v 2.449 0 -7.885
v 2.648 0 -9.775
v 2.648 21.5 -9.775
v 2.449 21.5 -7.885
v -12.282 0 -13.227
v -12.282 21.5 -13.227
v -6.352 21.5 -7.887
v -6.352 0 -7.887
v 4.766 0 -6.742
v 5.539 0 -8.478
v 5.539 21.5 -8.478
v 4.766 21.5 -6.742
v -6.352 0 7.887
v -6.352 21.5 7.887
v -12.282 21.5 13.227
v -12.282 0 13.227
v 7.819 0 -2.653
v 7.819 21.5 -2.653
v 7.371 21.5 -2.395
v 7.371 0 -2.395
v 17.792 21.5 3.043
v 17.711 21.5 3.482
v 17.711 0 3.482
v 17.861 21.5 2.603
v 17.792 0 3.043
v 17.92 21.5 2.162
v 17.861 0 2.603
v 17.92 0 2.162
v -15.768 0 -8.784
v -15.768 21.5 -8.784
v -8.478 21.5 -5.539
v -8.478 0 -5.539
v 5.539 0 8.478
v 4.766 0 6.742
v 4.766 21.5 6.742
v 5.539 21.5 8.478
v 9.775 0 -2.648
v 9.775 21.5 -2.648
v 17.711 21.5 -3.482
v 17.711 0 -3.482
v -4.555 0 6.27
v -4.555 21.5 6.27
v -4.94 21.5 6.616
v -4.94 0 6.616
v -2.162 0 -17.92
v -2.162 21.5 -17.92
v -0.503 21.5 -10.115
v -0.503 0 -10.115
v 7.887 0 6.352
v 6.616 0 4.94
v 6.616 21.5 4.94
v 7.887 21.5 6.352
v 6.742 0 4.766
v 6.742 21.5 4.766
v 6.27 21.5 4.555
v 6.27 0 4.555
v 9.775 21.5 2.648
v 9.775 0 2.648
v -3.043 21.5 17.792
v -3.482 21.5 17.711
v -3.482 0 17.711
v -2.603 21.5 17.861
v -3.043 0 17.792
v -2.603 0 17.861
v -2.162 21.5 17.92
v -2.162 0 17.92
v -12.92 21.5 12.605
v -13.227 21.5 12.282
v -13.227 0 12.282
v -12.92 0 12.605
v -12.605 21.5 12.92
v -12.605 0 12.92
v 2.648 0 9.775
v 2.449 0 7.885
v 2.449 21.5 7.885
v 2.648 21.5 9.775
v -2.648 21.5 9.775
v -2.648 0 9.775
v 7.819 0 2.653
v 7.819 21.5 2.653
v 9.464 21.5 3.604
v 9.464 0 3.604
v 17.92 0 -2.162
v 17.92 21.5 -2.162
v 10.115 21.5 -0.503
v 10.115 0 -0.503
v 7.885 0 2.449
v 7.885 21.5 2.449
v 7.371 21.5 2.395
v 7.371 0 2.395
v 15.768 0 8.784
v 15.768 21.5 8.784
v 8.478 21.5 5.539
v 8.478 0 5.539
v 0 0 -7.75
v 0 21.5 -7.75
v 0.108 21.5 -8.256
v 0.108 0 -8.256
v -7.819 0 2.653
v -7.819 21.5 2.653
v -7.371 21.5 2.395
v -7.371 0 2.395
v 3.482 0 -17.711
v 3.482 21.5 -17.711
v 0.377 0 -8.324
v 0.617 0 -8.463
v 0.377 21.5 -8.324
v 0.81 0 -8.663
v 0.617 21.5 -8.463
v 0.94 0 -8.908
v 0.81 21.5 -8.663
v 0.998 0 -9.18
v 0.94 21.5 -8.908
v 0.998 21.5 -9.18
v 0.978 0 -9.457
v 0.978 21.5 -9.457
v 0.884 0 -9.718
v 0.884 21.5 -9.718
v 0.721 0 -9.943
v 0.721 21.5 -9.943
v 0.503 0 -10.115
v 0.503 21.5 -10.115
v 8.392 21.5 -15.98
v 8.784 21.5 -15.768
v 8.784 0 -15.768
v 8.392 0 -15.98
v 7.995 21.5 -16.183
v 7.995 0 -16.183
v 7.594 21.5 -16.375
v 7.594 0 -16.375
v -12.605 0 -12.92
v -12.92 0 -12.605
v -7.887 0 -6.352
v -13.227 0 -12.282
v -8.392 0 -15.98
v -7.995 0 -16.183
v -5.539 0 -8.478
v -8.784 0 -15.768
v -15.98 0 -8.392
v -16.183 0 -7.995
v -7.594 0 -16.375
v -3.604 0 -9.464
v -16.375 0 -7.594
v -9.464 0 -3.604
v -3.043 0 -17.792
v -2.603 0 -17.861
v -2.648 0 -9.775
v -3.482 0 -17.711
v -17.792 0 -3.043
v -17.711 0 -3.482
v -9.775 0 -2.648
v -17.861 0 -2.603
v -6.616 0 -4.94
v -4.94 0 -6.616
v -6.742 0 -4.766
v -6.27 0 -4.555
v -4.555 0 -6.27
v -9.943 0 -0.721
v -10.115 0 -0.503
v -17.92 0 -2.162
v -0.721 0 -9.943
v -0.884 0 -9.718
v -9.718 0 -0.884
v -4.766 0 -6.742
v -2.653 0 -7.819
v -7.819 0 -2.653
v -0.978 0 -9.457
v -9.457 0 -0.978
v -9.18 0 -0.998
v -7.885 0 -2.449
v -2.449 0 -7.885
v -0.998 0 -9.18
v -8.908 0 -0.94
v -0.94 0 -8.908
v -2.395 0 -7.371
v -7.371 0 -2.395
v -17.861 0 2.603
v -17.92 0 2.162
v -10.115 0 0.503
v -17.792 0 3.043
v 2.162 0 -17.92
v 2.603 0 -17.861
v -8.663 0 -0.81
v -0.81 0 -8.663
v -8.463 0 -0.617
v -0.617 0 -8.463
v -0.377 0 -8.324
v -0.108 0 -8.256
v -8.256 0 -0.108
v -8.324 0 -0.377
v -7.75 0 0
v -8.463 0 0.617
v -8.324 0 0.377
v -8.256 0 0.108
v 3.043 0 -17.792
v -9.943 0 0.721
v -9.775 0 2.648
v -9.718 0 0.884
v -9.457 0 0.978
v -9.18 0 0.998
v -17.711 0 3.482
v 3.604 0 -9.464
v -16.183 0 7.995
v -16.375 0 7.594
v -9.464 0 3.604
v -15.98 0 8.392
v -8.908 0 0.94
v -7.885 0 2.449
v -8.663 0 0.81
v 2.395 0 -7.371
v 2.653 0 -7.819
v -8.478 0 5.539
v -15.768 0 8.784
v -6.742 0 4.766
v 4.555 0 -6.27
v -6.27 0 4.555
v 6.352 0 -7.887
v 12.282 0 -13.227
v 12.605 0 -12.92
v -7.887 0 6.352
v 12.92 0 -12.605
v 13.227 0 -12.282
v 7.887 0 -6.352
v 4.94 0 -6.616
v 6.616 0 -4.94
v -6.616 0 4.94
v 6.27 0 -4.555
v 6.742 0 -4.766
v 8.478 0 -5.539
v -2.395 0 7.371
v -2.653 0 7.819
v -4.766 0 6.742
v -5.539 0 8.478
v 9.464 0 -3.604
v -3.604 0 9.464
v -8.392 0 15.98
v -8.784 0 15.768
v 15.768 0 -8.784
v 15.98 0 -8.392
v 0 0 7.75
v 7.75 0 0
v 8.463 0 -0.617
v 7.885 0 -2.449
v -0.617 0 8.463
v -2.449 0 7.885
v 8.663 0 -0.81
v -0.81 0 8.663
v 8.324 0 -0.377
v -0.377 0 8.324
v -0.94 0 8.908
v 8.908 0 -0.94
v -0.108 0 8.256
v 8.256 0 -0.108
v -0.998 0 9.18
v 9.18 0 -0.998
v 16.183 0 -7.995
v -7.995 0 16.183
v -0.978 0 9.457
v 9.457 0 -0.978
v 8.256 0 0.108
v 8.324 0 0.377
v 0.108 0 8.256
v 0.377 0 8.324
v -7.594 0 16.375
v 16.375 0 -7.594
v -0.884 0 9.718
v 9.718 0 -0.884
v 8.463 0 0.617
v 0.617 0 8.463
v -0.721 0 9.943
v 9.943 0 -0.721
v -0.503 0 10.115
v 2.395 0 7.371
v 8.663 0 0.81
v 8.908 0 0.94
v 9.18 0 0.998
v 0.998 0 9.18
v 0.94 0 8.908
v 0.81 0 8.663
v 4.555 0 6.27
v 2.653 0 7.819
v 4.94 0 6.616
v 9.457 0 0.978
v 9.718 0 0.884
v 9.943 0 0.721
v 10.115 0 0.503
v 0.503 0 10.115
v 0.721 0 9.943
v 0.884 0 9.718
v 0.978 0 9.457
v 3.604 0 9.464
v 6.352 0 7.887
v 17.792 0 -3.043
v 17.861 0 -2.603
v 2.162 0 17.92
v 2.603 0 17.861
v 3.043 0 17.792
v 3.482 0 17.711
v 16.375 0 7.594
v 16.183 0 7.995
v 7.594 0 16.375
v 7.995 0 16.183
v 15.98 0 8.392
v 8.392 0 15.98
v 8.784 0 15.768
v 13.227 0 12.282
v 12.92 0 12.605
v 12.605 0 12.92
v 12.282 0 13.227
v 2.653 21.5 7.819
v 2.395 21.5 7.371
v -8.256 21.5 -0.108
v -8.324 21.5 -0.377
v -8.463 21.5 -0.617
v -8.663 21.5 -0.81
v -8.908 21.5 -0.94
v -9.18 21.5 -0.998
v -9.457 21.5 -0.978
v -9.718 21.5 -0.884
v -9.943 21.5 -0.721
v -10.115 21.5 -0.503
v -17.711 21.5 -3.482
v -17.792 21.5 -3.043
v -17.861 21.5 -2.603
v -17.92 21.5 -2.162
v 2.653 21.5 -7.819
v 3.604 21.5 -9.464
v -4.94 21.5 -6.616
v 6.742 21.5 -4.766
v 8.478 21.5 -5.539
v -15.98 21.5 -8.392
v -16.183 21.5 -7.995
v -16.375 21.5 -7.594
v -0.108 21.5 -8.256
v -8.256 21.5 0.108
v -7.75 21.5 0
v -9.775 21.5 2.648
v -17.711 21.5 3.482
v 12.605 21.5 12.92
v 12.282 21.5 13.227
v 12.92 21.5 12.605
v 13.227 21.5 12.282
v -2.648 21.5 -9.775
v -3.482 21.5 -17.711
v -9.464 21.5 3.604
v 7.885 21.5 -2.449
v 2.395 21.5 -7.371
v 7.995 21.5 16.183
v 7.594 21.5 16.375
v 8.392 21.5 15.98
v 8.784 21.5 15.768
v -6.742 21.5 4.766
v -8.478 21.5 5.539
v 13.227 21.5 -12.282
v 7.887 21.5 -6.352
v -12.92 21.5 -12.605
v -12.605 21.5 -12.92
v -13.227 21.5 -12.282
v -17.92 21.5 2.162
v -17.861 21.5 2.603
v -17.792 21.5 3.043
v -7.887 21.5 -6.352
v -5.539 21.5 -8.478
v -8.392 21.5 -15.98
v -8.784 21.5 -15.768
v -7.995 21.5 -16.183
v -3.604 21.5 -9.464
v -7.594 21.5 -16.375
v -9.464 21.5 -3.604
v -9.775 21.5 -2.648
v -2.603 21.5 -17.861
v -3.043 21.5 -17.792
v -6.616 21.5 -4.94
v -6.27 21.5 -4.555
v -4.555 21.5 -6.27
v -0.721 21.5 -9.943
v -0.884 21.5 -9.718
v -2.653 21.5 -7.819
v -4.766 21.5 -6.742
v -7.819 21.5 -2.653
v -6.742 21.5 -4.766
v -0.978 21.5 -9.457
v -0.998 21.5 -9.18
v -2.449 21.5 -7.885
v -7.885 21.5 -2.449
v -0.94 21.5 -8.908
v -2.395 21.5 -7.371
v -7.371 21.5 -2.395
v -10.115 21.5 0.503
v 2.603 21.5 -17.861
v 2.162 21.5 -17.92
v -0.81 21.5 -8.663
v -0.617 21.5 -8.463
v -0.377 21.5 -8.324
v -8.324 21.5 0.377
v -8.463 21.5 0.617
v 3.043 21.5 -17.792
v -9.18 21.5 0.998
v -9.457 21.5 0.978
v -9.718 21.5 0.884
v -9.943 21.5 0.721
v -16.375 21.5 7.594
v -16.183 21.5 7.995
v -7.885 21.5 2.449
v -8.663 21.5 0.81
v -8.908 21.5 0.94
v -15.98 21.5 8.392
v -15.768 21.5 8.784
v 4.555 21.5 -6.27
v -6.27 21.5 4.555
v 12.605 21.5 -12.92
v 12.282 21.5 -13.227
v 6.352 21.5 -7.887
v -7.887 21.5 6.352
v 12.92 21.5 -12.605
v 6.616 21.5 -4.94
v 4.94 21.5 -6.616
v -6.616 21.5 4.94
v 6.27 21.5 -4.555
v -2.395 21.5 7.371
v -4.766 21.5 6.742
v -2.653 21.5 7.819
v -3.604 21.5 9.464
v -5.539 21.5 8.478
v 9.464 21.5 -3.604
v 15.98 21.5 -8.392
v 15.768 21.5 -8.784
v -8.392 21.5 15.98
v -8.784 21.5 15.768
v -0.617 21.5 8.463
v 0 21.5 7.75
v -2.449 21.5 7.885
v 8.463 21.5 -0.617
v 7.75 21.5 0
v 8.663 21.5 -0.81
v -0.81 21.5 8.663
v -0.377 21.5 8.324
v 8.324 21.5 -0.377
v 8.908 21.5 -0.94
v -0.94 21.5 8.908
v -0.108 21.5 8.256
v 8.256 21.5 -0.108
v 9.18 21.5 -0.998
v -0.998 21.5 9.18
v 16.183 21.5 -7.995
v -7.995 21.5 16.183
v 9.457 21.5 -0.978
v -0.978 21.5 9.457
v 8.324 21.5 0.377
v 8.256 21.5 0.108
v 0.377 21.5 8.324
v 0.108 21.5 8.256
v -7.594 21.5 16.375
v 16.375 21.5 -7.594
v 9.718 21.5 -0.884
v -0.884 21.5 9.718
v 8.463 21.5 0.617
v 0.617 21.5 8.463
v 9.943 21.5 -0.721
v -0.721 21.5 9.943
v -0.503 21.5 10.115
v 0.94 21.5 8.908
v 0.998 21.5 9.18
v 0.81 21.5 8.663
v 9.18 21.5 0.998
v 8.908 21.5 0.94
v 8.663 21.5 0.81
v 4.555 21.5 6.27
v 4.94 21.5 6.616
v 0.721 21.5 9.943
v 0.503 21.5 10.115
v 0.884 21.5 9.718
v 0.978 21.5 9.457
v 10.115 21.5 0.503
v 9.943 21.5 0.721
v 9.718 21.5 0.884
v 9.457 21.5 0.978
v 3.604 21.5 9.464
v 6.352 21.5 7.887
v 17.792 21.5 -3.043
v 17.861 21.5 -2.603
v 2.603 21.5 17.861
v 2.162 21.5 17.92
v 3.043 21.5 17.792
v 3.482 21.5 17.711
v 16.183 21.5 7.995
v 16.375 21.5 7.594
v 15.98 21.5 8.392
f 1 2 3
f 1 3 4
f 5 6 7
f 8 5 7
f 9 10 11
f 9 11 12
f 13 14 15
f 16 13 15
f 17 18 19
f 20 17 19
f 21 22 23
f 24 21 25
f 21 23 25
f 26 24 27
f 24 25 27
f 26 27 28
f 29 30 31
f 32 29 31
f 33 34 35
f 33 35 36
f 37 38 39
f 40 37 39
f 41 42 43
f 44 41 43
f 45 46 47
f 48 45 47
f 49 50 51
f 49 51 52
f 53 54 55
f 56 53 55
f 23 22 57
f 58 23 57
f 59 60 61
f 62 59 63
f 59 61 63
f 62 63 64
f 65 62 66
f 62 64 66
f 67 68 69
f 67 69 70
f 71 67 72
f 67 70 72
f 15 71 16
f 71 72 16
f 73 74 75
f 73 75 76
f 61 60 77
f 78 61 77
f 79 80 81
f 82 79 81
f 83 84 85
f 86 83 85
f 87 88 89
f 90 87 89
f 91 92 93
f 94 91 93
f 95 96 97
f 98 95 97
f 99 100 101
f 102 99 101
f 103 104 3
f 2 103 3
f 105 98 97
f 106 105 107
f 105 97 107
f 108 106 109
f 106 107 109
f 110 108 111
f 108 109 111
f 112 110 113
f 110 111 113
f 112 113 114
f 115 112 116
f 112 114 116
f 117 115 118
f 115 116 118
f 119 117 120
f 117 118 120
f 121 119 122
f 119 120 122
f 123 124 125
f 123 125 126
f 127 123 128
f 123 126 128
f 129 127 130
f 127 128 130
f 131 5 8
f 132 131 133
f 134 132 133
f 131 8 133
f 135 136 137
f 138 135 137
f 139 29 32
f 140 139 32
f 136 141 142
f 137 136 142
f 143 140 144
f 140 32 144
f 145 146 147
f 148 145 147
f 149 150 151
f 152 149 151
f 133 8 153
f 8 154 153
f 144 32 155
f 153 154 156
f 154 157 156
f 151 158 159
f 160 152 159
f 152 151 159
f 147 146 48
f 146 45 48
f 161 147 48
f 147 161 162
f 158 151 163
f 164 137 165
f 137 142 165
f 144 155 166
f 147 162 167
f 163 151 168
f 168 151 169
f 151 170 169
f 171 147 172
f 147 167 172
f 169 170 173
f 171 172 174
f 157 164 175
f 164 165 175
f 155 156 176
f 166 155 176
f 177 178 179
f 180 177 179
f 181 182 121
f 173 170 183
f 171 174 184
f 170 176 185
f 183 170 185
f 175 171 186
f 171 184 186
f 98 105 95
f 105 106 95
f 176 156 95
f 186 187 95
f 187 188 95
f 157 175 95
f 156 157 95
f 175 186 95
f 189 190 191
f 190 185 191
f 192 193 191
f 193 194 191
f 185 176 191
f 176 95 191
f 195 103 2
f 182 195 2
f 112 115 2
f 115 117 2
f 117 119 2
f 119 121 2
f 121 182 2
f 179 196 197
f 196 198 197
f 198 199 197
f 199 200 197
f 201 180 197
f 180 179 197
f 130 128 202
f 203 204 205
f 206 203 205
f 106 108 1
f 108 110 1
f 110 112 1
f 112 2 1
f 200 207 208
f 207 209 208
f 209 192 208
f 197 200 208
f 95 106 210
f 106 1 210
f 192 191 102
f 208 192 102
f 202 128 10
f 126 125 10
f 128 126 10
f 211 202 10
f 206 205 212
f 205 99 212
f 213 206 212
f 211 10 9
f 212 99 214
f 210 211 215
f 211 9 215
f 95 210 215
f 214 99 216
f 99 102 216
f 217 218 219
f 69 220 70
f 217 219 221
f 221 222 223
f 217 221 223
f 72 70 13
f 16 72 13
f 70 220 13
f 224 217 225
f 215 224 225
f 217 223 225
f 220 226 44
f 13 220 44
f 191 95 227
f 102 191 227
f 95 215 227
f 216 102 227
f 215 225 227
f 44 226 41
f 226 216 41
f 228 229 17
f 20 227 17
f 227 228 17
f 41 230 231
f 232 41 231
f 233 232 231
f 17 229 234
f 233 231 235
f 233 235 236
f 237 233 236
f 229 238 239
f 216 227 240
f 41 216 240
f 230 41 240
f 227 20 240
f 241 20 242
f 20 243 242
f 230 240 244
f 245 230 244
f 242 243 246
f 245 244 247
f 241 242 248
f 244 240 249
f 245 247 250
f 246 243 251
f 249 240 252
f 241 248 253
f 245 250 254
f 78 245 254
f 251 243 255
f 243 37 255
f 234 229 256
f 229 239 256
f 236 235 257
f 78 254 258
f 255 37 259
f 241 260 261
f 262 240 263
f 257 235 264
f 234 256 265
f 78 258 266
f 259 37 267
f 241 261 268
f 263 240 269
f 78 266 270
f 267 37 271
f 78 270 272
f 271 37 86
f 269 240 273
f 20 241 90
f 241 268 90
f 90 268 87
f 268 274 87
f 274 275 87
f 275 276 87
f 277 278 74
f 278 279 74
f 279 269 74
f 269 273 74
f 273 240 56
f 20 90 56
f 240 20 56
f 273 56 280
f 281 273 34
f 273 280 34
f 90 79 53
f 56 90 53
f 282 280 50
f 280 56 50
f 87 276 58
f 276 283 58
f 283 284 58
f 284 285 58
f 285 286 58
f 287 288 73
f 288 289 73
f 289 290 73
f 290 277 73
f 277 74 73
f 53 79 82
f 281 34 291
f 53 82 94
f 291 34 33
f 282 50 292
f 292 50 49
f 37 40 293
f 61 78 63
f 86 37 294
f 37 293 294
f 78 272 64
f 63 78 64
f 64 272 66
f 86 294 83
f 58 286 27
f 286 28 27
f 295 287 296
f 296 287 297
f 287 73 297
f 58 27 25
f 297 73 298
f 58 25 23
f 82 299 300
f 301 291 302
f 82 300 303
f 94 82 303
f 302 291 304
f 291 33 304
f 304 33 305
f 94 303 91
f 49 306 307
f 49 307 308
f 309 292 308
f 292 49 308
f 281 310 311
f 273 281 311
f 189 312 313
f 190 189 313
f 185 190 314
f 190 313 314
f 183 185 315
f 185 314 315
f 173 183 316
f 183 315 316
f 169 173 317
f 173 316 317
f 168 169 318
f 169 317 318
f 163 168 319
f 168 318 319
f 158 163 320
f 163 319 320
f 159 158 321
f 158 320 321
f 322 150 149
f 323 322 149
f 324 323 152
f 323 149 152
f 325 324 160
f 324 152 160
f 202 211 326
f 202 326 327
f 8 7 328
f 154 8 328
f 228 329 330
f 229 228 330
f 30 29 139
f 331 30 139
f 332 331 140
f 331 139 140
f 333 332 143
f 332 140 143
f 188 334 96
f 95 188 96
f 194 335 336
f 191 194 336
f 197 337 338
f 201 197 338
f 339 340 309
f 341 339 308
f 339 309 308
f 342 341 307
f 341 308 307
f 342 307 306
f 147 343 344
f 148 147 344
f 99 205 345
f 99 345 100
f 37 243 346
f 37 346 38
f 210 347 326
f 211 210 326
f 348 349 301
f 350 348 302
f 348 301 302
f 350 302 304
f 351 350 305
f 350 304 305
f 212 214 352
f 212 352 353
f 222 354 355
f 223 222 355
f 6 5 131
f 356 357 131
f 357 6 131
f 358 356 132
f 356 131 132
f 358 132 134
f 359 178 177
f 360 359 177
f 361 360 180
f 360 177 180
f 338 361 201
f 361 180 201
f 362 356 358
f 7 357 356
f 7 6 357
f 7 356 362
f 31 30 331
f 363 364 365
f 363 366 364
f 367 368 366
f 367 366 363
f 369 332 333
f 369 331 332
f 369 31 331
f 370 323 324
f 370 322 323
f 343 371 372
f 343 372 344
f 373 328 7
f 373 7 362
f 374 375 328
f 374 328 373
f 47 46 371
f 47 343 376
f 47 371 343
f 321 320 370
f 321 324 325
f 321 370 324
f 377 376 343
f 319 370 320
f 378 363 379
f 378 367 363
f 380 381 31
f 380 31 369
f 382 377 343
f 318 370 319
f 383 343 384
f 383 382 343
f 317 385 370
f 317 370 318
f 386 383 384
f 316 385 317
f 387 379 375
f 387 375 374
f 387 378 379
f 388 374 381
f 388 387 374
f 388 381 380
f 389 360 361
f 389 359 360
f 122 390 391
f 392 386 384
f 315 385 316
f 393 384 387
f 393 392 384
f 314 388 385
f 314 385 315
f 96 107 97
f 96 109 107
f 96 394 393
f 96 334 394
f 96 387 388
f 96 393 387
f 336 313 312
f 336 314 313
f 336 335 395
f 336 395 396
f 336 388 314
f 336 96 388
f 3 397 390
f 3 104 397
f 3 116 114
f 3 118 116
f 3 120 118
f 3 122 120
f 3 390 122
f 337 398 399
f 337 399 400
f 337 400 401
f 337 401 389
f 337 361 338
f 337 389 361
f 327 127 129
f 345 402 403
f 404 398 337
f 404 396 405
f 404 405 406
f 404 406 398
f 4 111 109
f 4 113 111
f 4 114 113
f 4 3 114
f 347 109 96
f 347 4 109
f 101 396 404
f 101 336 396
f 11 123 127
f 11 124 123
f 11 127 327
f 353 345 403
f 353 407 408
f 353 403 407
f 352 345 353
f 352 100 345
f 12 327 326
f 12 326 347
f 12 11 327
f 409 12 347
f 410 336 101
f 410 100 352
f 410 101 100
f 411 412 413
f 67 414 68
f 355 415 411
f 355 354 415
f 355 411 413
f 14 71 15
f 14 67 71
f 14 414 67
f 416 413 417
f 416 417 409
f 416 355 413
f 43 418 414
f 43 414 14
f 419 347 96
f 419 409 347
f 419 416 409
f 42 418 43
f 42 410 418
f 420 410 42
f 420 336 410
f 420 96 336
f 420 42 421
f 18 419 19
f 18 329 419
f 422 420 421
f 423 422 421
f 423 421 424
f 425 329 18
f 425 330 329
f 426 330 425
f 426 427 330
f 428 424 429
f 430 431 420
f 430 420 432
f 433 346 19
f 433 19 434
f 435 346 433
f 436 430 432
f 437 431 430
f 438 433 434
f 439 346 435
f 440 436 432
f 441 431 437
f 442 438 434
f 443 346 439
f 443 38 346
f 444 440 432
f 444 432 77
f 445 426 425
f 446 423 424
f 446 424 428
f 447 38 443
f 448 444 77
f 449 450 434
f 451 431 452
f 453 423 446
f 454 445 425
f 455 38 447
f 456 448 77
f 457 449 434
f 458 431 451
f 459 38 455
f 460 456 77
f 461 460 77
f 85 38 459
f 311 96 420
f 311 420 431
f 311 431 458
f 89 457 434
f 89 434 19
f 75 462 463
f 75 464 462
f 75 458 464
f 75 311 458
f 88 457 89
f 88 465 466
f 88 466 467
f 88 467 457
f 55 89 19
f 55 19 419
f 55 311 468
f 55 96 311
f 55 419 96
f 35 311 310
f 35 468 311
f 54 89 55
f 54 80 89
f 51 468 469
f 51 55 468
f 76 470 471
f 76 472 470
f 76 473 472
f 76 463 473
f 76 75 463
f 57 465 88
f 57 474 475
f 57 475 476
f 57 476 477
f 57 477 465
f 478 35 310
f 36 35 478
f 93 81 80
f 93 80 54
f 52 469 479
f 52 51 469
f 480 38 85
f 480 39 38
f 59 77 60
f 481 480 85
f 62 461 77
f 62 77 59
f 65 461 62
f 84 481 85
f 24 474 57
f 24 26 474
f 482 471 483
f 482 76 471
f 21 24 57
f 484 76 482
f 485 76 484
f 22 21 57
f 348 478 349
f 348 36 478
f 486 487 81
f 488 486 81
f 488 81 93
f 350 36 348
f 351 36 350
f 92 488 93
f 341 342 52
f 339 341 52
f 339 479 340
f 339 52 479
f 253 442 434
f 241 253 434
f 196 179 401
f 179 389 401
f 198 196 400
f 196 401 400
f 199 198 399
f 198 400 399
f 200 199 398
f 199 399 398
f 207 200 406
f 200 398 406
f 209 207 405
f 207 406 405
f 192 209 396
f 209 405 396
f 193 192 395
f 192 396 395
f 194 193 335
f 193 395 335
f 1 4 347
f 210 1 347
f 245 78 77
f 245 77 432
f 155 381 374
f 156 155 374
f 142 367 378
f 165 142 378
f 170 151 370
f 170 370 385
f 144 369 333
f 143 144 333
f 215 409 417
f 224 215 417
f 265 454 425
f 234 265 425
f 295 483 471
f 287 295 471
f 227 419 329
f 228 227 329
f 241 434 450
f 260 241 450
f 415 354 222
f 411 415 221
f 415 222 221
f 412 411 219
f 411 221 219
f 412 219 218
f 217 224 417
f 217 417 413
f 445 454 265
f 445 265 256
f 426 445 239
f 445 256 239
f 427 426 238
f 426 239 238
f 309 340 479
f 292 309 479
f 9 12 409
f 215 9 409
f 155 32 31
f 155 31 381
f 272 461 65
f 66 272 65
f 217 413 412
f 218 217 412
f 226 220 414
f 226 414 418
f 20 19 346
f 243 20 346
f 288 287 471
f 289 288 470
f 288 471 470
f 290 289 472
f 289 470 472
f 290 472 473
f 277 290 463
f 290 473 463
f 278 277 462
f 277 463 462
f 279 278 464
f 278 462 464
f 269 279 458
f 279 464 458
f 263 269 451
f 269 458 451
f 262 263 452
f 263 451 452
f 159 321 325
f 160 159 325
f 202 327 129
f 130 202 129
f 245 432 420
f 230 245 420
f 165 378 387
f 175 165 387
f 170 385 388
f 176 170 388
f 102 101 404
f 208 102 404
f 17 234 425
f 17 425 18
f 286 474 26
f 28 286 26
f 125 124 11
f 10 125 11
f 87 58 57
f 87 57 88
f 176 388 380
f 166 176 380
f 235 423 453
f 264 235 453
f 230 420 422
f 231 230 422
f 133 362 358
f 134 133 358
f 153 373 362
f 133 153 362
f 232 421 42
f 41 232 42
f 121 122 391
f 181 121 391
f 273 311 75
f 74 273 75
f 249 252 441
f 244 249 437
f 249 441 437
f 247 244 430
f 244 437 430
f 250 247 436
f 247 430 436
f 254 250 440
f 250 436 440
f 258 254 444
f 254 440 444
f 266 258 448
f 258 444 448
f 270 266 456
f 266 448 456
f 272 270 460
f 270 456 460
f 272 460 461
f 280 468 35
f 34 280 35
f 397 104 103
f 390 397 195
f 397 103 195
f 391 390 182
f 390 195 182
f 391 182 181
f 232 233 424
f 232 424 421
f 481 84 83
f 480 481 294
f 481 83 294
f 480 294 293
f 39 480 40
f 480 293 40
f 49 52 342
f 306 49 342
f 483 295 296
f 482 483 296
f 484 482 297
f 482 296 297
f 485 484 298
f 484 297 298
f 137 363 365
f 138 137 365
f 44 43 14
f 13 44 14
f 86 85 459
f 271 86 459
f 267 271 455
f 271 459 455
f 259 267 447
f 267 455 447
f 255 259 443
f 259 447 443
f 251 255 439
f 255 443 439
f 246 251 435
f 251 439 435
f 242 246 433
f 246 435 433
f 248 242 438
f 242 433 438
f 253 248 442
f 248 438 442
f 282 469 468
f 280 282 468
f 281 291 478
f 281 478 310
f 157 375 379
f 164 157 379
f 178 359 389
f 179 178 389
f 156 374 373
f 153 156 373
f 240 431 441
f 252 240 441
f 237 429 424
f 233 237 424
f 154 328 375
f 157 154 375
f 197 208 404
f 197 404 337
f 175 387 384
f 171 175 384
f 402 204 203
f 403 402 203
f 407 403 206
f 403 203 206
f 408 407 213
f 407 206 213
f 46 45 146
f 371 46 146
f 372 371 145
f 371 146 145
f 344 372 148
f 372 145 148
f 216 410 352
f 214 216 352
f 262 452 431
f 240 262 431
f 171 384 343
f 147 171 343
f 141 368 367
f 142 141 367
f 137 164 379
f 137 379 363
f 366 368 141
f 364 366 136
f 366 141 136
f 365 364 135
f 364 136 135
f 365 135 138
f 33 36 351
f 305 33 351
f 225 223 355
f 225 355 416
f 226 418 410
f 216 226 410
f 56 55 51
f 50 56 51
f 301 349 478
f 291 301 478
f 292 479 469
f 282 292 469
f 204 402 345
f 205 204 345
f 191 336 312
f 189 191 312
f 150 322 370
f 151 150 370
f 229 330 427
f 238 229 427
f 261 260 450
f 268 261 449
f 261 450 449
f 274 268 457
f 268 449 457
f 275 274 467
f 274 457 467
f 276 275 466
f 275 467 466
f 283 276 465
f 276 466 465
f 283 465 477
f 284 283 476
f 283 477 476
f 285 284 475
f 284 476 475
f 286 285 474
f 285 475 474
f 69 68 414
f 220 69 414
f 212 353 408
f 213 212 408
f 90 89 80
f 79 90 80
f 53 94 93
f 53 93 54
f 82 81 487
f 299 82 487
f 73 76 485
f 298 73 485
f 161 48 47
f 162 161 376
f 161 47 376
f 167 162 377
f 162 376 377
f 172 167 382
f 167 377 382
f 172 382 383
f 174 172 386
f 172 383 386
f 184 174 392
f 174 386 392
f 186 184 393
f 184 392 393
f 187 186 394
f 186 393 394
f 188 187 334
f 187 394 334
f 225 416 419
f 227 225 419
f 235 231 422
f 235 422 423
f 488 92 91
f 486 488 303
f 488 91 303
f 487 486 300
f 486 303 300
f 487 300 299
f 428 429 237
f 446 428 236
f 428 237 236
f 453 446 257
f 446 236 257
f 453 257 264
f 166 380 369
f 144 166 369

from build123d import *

# Parameters (mm, degrees)
SKETCH1_R           = 18.05
BOSS_EXTRUDE1_DEPTH = 21.5
SKETCH2_R           = 1
CUT_EXTRUDE1_DEPTH  = 34.374466288
CUT_EXTRUDE2_DEPTH  = 34.374466288
CIRPATTERN1_COUNT   = 20


with BuildPart() as part:
    # Sketch1 → Boss-Extrude1 (new body)
    with BuildSketch(Plane(origin=(0, 0, 0), x_dir=(1, 0, 0), z_dir=(0, 1, 0))):
        with Locations(Location((0, 0, 0), (0, 0, 270))):
            Circle(SKETCH1_R)
    extrude(amount=BOSS_EXTRUDE1_DEPTH)

    # Sketch2 → Cut-Extrude1 (cut, through all)
    with BuildSketch(Plane(origin=(0, 21.5, 0), x_dir=(1, 0, 0), z_dir=(0, 1, 0))):
        with Locations(Location((-9.25, 0, 0), (0, 0, 270))):
            Circle(SKETCH2_R)
        with Locations(Location((0, 9.25, 0), (0, 0, 270))):
            Circle(SKETCH2_R)
        with Locations(Location((9.25, 0, 0), (0, 0, 270))):
            Circle(SKETCH2_R)
        with Locations(Location((0, -9.25, 0), (0, 0, 270))):
            Circle(SKETCH2_R)
    extrude(amount=-CUT_EXTRUDE1_DEPTH, mode=Mode.SUBTRACT)

    # Sketch3 → Cut-Extrude2 (cut, through all)
    with BuildSketch(Plane(origin=(0, 21.5, 0), x_dir=(1, 0, 0), z_dir=(0, 1, 0))):
        with BuildLine():
            ThreePointArc((2.161718459, 17.92008575), (0, 18.05), (-2.161718459, 17.92008575))
            Line((-2.161718459, 17.92008575), (-0.502594701, 10.114522161))
            ThreePointArc((-0.502594701, 10.114522161), (0, 10.25), (0.502594701, 10.114522161))
            Line((0.502594701, 10.114522161), (2.161718459, 17.92008575))
        make_face()
        with BuildLine():
            ThreePointArc((0.502594701, 10.114522161), (0, 10.25), (-0.502594701, 10.114522161))
            Line((-0.502594701, 10.114522161), (-0.107510264, 8.255796025))
            ThreePointArc((-0.107510264, 8.255796025), (0, 8.25), (0.107510264, 8.255796025))
            Line((0.107510264, 8.255796025), (0.502594701, 10.114522161))
        make_face()
        with BuildLine():
            ThreePointArc((0.107510264, 8.255796025), (0, 8.25), (-0.107510264, 8.255796025))
            Line((-0.107510264, 8.255796025), (0, 7.75))
            Line((0, 7.75), (0.107510264, 8.255796025))
        make_face()
    cut_extrude2 = extrude(amount=-CUT_EXTRUDE2_DEPTH, mode=Mode.SUBTRACT)

    # CirPattern1: Cut-Extrude2 ×20 about axis
    cirpattern1_axis = Axis((0, 0, 0), (0, 1, 0))
    for i in range(1, CIRPATTERN1_COUNT):
        add(cut_extrude2.rotate(cirpattern1_axis, i * 360 / CIRPATTERN1_COUNT), mode=Mode.SUBTRACT)


solid = part.part
